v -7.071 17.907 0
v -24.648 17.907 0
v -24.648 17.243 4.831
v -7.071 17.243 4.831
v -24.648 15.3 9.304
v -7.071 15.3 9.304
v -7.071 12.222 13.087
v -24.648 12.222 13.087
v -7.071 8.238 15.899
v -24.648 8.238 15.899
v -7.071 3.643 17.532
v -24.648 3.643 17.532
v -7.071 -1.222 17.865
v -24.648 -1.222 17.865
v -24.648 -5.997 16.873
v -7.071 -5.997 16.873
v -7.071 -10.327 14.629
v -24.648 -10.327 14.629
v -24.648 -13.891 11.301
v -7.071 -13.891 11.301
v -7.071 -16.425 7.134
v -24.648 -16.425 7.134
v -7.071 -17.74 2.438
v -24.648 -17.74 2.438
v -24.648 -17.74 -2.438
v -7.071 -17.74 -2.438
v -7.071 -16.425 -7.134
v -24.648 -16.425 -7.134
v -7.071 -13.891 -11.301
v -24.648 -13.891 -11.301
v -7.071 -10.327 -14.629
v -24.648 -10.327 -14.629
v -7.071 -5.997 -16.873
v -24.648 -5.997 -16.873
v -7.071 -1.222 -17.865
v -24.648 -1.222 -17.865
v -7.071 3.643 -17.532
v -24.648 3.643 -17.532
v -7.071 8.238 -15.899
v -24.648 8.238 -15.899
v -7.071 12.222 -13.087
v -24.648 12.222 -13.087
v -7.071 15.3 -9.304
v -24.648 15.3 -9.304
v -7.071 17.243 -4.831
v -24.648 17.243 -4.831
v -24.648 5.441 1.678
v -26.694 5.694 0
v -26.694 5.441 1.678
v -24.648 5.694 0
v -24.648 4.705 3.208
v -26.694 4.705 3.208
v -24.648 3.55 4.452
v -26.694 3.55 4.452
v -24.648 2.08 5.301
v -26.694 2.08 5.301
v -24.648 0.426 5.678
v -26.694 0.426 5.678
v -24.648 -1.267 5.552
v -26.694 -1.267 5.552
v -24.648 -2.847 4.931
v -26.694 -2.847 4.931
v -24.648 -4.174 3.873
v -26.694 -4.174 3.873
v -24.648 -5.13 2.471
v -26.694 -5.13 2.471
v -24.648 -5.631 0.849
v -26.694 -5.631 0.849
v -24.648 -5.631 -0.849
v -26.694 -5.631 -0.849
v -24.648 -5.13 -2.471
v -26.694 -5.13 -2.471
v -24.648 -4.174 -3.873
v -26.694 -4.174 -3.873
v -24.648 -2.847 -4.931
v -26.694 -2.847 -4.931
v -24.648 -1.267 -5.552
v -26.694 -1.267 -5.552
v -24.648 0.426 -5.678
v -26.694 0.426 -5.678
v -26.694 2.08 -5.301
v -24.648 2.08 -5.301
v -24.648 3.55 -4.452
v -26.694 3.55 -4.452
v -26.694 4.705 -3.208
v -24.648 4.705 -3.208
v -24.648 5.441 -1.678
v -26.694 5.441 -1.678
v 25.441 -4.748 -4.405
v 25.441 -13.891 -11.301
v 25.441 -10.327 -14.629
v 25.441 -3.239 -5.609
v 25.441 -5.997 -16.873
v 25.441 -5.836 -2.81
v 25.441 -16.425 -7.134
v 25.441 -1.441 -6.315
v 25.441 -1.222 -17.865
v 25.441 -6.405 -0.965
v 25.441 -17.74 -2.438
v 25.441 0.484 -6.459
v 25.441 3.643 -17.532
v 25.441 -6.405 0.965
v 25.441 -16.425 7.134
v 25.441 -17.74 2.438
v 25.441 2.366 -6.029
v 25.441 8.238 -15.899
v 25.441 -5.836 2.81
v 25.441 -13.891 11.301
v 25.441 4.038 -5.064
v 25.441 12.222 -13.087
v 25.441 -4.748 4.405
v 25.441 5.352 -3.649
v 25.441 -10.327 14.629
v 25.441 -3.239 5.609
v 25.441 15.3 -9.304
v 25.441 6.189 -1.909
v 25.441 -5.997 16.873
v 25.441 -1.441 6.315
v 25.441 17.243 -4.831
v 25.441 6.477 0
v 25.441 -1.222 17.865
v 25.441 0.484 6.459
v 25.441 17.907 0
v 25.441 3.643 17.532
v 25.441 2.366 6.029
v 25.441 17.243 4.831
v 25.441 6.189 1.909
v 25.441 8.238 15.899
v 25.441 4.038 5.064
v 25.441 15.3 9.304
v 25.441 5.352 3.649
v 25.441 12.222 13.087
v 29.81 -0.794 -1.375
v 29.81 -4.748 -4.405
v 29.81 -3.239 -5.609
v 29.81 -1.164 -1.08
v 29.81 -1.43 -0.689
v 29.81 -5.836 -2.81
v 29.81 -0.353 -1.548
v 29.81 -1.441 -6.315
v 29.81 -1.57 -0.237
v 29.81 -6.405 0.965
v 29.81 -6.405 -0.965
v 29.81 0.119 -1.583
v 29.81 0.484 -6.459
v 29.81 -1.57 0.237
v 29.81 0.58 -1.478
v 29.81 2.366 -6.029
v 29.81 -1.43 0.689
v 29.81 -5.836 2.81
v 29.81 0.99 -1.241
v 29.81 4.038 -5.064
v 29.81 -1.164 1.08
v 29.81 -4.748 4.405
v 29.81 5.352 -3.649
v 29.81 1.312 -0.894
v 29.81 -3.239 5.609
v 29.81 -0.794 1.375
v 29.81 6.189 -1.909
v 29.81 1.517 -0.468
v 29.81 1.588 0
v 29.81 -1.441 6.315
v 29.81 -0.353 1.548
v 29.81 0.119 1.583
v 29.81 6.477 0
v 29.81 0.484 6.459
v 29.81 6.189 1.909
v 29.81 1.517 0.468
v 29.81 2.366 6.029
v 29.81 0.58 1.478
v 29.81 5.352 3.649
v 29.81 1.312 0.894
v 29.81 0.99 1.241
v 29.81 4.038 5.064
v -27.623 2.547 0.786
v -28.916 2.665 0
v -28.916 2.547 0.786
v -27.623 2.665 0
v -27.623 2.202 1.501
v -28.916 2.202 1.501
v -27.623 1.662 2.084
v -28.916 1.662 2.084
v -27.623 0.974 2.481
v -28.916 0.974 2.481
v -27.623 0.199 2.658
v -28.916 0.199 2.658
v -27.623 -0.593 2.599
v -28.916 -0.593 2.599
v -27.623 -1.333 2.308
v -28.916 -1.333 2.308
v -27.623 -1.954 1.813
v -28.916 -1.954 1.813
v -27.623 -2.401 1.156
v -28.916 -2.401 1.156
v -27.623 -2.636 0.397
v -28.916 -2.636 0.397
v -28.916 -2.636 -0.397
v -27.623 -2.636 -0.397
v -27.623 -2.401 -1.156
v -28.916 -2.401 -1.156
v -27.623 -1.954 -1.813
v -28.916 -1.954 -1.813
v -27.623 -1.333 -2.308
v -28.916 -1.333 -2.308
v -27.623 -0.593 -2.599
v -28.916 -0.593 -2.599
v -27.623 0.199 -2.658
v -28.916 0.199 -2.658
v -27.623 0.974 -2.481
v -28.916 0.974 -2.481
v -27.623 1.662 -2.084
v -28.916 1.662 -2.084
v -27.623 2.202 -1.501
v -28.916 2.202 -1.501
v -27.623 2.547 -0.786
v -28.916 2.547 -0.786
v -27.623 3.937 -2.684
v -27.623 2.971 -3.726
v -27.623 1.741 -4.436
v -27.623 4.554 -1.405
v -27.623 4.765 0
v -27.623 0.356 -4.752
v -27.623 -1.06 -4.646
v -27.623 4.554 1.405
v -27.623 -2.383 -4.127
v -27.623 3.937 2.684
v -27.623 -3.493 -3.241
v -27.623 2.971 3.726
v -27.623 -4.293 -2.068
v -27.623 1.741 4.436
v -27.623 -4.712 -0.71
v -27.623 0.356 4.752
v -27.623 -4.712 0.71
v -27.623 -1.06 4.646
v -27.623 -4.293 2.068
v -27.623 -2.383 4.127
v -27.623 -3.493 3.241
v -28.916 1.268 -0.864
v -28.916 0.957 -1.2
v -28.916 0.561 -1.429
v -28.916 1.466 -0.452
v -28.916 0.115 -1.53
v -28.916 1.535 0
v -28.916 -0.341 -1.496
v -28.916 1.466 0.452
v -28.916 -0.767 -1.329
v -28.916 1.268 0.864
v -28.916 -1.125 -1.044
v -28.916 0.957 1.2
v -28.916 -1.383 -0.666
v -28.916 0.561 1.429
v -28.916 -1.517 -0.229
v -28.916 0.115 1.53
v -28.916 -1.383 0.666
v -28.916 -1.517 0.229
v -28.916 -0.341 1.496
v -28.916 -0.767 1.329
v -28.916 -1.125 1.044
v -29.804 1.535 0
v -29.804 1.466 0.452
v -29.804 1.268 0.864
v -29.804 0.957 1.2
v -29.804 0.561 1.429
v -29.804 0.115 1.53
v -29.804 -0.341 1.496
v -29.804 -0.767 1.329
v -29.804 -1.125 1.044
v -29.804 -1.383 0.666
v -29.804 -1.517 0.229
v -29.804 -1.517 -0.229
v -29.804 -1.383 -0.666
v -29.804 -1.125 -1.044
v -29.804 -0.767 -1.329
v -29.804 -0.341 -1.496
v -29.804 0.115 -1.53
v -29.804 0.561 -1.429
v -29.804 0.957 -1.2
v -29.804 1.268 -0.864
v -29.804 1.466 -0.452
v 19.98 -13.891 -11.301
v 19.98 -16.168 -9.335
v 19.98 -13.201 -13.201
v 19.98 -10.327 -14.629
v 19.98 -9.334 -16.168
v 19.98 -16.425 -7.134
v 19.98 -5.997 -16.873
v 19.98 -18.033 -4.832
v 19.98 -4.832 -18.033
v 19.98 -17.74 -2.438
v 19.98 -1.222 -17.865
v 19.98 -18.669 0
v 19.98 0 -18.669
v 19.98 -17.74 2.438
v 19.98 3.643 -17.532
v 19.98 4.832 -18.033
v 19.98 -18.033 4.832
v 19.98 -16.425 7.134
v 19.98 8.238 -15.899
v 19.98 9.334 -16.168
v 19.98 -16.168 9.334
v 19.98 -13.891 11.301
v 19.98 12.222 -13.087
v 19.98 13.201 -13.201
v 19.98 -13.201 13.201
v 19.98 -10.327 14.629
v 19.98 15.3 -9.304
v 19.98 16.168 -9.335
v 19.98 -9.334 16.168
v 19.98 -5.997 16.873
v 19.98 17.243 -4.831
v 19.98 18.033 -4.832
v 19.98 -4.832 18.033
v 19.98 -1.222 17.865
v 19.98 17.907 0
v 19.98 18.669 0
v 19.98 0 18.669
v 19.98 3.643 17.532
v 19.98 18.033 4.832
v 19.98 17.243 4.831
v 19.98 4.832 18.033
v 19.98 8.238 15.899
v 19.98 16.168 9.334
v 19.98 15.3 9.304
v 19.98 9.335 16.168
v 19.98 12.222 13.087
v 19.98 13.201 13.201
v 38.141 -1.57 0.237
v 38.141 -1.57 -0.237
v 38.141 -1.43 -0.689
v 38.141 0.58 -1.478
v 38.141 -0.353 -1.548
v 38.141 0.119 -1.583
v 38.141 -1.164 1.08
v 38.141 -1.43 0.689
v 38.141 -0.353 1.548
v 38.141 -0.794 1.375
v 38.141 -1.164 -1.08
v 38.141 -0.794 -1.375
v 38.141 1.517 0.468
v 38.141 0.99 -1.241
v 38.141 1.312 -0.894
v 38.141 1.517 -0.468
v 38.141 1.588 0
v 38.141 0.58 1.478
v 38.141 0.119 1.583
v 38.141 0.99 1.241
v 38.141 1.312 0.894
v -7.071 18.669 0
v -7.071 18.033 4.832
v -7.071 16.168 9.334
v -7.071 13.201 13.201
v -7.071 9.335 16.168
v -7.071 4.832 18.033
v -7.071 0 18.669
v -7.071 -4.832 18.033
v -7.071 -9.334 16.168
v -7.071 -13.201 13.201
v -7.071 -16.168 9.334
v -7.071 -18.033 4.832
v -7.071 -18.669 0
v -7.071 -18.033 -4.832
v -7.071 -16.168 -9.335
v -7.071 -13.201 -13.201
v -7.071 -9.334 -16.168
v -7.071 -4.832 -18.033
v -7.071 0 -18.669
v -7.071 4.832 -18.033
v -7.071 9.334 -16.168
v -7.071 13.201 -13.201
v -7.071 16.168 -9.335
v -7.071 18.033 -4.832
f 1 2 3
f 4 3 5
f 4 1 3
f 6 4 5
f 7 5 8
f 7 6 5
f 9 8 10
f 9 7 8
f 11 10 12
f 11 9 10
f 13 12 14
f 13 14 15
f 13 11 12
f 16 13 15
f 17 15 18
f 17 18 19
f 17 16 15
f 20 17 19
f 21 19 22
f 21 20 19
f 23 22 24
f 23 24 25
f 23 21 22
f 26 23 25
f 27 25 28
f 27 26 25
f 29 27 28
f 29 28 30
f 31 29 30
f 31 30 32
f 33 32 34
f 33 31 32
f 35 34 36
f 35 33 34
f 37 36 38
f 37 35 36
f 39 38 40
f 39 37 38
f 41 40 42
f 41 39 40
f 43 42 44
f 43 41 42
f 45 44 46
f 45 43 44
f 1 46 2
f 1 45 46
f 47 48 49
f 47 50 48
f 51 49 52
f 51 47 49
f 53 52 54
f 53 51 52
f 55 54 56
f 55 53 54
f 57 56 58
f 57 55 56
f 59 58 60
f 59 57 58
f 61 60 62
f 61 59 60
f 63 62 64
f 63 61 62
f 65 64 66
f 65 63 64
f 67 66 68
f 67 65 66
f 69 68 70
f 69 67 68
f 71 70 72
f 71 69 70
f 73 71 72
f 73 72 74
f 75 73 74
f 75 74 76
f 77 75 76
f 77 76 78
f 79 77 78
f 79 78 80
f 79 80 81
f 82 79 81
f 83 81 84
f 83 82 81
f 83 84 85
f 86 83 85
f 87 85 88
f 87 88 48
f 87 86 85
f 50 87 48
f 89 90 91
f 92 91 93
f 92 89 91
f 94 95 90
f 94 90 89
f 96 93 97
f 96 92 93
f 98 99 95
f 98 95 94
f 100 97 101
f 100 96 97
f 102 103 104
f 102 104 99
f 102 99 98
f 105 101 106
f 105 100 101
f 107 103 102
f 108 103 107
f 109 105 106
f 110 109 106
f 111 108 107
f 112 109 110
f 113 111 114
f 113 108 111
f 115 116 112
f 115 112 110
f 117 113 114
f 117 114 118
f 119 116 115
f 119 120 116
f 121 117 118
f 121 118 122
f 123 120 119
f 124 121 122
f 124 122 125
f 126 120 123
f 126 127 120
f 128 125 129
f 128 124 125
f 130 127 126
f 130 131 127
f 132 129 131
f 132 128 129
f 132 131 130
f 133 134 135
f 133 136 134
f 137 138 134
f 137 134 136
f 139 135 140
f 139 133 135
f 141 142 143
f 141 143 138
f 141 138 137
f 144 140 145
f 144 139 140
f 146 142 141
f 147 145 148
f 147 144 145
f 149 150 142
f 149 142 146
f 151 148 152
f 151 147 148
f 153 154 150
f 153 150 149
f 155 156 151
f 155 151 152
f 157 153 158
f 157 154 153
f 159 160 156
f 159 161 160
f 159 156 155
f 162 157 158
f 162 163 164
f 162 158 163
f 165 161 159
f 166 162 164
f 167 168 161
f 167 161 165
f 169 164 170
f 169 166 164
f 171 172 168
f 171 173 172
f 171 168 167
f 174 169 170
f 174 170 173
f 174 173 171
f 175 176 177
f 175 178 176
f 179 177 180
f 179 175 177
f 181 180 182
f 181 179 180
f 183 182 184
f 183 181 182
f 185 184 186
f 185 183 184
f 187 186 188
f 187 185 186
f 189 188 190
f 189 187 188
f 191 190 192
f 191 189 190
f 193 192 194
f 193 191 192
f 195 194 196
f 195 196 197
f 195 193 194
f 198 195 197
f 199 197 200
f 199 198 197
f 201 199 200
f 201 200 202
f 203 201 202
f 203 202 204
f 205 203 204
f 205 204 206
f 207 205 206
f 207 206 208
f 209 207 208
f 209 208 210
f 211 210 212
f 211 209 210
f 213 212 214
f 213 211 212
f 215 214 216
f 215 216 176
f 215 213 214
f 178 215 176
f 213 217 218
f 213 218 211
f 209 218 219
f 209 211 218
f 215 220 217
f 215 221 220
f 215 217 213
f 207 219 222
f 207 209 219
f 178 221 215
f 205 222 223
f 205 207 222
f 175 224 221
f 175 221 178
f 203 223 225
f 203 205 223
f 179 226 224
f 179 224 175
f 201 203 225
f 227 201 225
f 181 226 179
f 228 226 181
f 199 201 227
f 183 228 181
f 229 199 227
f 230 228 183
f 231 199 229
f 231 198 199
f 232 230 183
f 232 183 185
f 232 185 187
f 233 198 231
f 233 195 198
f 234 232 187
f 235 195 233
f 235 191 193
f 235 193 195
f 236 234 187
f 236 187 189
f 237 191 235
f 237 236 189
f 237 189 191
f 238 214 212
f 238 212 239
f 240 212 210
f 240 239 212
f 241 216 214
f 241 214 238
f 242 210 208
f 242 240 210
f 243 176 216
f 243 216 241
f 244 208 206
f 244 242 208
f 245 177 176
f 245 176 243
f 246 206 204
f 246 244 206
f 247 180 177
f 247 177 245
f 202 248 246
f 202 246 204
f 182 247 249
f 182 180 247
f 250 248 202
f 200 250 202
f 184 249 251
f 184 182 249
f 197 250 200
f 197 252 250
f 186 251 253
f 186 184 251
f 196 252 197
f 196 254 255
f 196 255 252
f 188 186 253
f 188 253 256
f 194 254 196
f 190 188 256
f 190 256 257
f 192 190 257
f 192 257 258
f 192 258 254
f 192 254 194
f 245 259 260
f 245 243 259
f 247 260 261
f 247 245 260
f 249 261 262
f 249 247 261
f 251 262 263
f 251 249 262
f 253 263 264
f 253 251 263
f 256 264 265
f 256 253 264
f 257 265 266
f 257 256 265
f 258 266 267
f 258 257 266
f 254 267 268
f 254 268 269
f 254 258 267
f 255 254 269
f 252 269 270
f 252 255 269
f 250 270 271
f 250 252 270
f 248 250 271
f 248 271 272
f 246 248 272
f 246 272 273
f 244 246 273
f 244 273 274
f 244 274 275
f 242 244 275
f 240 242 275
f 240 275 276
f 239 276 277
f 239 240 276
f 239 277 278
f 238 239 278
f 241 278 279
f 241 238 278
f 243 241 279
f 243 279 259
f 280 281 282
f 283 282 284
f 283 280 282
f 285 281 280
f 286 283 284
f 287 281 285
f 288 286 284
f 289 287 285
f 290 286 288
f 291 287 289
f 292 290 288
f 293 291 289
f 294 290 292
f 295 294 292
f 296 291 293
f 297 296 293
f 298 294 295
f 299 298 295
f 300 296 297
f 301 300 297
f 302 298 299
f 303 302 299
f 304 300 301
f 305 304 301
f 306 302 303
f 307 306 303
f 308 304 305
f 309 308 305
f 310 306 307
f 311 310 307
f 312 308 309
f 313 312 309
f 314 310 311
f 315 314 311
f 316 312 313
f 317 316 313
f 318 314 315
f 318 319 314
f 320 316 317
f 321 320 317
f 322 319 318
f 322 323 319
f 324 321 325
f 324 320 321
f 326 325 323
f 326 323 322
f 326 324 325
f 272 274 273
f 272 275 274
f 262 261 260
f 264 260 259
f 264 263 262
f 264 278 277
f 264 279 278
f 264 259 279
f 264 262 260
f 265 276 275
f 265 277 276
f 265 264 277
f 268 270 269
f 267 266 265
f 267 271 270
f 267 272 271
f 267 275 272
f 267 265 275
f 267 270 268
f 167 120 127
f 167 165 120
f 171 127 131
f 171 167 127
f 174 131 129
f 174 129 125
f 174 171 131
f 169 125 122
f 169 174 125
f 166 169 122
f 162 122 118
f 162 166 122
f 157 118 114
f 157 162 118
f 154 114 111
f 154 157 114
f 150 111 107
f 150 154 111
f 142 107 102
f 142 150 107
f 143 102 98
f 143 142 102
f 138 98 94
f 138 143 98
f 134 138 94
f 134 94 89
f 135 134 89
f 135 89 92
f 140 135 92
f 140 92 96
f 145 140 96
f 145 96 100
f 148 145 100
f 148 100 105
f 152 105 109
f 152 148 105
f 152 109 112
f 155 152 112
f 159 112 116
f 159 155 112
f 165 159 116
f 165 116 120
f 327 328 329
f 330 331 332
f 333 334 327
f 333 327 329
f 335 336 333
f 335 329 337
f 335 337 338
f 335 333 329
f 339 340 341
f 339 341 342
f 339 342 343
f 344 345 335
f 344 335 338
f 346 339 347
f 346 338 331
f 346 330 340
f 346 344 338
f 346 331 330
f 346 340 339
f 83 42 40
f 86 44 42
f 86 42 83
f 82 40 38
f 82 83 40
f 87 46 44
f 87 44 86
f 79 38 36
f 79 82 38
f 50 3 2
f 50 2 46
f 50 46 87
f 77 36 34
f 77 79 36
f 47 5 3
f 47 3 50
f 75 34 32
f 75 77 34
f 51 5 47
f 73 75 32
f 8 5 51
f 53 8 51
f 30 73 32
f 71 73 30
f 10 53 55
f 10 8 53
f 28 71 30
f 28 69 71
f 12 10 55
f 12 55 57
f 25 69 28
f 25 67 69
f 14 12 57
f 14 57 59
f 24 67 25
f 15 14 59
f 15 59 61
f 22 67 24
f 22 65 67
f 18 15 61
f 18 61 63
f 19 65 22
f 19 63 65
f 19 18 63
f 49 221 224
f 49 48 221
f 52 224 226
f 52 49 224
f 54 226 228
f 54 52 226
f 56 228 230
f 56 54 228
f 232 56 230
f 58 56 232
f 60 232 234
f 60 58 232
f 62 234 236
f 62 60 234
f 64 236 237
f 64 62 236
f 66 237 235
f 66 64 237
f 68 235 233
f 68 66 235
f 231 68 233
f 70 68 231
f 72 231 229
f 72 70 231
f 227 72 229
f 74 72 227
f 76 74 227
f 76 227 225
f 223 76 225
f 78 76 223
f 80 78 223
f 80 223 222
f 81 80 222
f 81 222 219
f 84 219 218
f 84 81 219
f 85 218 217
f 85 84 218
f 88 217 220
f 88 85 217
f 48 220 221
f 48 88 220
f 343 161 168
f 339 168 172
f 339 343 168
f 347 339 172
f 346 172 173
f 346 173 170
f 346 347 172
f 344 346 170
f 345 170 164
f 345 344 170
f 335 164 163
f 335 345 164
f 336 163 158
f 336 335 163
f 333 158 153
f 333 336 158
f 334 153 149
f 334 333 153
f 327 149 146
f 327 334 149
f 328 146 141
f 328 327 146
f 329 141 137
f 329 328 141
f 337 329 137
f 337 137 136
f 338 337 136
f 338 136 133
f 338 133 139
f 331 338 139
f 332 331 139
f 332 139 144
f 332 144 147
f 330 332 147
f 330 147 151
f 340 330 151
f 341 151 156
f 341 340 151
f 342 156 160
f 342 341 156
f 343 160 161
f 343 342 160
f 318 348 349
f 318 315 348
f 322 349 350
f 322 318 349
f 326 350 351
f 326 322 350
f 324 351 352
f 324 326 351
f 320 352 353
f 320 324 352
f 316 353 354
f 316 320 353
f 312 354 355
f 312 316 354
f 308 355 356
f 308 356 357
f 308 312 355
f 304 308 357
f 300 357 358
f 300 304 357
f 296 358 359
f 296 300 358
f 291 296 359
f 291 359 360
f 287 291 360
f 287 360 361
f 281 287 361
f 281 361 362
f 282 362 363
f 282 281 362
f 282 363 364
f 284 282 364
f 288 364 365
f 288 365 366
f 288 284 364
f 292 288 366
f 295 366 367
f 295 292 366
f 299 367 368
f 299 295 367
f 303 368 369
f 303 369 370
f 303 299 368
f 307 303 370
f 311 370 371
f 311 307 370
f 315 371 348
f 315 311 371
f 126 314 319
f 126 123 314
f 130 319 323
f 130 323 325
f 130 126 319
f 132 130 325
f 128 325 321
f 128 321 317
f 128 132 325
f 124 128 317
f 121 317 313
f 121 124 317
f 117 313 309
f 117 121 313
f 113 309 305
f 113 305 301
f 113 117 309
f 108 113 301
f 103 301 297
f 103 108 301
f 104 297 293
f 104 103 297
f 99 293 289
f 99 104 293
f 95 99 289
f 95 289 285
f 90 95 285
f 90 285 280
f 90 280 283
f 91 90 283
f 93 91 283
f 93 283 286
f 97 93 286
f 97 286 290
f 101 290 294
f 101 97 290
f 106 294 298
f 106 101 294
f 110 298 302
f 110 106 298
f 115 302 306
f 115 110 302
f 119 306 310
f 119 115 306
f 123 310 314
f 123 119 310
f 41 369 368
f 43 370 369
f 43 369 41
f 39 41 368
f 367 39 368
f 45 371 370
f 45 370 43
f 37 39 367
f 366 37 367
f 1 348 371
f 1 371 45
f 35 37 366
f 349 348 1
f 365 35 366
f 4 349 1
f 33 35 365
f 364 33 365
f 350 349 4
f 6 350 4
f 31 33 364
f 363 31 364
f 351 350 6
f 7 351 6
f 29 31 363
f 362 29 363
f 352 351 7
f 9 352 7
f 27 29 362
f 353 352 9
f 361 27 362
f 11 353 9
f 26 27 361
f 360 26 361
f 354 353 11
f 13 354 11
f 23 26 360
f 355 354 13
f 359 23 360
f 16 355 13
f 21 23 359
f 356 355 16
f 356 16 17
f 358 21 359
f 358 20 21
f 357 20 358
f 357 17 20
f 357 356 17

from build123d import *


with BuildPart() as part:
    # Sketch1 → Revolve1 (revolve)
    with BuildSketch(Plane.XY):
        Polygon((-29.804083682, 0), (-29.804083682, 1.534627615), (-28.915615063, 1.534627615), (-28.915615063, 2.665405858), (-27.623297071, 2.665405858), (-27.623297071, 4.765422594), (-26.694443515, 5.694276151), (-24.647883682, 5.694276151), (-24.647883682, 17.907), (-7.071083682, 17.907), (-7.071083682, 18.669), (19.979916318, 18.669), (19.979916318, 17.907), (25.440916318, 17.907), (25.440916318, 6.477), (29.809716318, 6.477), (29.809716318, 1.5875), (38.140916318, 1.5875), (38.140916318, 0), align=None)
    revolve(axis=Axis((-37.638761506, 0, 0), (1, 0, 0)))


solid = part.part
